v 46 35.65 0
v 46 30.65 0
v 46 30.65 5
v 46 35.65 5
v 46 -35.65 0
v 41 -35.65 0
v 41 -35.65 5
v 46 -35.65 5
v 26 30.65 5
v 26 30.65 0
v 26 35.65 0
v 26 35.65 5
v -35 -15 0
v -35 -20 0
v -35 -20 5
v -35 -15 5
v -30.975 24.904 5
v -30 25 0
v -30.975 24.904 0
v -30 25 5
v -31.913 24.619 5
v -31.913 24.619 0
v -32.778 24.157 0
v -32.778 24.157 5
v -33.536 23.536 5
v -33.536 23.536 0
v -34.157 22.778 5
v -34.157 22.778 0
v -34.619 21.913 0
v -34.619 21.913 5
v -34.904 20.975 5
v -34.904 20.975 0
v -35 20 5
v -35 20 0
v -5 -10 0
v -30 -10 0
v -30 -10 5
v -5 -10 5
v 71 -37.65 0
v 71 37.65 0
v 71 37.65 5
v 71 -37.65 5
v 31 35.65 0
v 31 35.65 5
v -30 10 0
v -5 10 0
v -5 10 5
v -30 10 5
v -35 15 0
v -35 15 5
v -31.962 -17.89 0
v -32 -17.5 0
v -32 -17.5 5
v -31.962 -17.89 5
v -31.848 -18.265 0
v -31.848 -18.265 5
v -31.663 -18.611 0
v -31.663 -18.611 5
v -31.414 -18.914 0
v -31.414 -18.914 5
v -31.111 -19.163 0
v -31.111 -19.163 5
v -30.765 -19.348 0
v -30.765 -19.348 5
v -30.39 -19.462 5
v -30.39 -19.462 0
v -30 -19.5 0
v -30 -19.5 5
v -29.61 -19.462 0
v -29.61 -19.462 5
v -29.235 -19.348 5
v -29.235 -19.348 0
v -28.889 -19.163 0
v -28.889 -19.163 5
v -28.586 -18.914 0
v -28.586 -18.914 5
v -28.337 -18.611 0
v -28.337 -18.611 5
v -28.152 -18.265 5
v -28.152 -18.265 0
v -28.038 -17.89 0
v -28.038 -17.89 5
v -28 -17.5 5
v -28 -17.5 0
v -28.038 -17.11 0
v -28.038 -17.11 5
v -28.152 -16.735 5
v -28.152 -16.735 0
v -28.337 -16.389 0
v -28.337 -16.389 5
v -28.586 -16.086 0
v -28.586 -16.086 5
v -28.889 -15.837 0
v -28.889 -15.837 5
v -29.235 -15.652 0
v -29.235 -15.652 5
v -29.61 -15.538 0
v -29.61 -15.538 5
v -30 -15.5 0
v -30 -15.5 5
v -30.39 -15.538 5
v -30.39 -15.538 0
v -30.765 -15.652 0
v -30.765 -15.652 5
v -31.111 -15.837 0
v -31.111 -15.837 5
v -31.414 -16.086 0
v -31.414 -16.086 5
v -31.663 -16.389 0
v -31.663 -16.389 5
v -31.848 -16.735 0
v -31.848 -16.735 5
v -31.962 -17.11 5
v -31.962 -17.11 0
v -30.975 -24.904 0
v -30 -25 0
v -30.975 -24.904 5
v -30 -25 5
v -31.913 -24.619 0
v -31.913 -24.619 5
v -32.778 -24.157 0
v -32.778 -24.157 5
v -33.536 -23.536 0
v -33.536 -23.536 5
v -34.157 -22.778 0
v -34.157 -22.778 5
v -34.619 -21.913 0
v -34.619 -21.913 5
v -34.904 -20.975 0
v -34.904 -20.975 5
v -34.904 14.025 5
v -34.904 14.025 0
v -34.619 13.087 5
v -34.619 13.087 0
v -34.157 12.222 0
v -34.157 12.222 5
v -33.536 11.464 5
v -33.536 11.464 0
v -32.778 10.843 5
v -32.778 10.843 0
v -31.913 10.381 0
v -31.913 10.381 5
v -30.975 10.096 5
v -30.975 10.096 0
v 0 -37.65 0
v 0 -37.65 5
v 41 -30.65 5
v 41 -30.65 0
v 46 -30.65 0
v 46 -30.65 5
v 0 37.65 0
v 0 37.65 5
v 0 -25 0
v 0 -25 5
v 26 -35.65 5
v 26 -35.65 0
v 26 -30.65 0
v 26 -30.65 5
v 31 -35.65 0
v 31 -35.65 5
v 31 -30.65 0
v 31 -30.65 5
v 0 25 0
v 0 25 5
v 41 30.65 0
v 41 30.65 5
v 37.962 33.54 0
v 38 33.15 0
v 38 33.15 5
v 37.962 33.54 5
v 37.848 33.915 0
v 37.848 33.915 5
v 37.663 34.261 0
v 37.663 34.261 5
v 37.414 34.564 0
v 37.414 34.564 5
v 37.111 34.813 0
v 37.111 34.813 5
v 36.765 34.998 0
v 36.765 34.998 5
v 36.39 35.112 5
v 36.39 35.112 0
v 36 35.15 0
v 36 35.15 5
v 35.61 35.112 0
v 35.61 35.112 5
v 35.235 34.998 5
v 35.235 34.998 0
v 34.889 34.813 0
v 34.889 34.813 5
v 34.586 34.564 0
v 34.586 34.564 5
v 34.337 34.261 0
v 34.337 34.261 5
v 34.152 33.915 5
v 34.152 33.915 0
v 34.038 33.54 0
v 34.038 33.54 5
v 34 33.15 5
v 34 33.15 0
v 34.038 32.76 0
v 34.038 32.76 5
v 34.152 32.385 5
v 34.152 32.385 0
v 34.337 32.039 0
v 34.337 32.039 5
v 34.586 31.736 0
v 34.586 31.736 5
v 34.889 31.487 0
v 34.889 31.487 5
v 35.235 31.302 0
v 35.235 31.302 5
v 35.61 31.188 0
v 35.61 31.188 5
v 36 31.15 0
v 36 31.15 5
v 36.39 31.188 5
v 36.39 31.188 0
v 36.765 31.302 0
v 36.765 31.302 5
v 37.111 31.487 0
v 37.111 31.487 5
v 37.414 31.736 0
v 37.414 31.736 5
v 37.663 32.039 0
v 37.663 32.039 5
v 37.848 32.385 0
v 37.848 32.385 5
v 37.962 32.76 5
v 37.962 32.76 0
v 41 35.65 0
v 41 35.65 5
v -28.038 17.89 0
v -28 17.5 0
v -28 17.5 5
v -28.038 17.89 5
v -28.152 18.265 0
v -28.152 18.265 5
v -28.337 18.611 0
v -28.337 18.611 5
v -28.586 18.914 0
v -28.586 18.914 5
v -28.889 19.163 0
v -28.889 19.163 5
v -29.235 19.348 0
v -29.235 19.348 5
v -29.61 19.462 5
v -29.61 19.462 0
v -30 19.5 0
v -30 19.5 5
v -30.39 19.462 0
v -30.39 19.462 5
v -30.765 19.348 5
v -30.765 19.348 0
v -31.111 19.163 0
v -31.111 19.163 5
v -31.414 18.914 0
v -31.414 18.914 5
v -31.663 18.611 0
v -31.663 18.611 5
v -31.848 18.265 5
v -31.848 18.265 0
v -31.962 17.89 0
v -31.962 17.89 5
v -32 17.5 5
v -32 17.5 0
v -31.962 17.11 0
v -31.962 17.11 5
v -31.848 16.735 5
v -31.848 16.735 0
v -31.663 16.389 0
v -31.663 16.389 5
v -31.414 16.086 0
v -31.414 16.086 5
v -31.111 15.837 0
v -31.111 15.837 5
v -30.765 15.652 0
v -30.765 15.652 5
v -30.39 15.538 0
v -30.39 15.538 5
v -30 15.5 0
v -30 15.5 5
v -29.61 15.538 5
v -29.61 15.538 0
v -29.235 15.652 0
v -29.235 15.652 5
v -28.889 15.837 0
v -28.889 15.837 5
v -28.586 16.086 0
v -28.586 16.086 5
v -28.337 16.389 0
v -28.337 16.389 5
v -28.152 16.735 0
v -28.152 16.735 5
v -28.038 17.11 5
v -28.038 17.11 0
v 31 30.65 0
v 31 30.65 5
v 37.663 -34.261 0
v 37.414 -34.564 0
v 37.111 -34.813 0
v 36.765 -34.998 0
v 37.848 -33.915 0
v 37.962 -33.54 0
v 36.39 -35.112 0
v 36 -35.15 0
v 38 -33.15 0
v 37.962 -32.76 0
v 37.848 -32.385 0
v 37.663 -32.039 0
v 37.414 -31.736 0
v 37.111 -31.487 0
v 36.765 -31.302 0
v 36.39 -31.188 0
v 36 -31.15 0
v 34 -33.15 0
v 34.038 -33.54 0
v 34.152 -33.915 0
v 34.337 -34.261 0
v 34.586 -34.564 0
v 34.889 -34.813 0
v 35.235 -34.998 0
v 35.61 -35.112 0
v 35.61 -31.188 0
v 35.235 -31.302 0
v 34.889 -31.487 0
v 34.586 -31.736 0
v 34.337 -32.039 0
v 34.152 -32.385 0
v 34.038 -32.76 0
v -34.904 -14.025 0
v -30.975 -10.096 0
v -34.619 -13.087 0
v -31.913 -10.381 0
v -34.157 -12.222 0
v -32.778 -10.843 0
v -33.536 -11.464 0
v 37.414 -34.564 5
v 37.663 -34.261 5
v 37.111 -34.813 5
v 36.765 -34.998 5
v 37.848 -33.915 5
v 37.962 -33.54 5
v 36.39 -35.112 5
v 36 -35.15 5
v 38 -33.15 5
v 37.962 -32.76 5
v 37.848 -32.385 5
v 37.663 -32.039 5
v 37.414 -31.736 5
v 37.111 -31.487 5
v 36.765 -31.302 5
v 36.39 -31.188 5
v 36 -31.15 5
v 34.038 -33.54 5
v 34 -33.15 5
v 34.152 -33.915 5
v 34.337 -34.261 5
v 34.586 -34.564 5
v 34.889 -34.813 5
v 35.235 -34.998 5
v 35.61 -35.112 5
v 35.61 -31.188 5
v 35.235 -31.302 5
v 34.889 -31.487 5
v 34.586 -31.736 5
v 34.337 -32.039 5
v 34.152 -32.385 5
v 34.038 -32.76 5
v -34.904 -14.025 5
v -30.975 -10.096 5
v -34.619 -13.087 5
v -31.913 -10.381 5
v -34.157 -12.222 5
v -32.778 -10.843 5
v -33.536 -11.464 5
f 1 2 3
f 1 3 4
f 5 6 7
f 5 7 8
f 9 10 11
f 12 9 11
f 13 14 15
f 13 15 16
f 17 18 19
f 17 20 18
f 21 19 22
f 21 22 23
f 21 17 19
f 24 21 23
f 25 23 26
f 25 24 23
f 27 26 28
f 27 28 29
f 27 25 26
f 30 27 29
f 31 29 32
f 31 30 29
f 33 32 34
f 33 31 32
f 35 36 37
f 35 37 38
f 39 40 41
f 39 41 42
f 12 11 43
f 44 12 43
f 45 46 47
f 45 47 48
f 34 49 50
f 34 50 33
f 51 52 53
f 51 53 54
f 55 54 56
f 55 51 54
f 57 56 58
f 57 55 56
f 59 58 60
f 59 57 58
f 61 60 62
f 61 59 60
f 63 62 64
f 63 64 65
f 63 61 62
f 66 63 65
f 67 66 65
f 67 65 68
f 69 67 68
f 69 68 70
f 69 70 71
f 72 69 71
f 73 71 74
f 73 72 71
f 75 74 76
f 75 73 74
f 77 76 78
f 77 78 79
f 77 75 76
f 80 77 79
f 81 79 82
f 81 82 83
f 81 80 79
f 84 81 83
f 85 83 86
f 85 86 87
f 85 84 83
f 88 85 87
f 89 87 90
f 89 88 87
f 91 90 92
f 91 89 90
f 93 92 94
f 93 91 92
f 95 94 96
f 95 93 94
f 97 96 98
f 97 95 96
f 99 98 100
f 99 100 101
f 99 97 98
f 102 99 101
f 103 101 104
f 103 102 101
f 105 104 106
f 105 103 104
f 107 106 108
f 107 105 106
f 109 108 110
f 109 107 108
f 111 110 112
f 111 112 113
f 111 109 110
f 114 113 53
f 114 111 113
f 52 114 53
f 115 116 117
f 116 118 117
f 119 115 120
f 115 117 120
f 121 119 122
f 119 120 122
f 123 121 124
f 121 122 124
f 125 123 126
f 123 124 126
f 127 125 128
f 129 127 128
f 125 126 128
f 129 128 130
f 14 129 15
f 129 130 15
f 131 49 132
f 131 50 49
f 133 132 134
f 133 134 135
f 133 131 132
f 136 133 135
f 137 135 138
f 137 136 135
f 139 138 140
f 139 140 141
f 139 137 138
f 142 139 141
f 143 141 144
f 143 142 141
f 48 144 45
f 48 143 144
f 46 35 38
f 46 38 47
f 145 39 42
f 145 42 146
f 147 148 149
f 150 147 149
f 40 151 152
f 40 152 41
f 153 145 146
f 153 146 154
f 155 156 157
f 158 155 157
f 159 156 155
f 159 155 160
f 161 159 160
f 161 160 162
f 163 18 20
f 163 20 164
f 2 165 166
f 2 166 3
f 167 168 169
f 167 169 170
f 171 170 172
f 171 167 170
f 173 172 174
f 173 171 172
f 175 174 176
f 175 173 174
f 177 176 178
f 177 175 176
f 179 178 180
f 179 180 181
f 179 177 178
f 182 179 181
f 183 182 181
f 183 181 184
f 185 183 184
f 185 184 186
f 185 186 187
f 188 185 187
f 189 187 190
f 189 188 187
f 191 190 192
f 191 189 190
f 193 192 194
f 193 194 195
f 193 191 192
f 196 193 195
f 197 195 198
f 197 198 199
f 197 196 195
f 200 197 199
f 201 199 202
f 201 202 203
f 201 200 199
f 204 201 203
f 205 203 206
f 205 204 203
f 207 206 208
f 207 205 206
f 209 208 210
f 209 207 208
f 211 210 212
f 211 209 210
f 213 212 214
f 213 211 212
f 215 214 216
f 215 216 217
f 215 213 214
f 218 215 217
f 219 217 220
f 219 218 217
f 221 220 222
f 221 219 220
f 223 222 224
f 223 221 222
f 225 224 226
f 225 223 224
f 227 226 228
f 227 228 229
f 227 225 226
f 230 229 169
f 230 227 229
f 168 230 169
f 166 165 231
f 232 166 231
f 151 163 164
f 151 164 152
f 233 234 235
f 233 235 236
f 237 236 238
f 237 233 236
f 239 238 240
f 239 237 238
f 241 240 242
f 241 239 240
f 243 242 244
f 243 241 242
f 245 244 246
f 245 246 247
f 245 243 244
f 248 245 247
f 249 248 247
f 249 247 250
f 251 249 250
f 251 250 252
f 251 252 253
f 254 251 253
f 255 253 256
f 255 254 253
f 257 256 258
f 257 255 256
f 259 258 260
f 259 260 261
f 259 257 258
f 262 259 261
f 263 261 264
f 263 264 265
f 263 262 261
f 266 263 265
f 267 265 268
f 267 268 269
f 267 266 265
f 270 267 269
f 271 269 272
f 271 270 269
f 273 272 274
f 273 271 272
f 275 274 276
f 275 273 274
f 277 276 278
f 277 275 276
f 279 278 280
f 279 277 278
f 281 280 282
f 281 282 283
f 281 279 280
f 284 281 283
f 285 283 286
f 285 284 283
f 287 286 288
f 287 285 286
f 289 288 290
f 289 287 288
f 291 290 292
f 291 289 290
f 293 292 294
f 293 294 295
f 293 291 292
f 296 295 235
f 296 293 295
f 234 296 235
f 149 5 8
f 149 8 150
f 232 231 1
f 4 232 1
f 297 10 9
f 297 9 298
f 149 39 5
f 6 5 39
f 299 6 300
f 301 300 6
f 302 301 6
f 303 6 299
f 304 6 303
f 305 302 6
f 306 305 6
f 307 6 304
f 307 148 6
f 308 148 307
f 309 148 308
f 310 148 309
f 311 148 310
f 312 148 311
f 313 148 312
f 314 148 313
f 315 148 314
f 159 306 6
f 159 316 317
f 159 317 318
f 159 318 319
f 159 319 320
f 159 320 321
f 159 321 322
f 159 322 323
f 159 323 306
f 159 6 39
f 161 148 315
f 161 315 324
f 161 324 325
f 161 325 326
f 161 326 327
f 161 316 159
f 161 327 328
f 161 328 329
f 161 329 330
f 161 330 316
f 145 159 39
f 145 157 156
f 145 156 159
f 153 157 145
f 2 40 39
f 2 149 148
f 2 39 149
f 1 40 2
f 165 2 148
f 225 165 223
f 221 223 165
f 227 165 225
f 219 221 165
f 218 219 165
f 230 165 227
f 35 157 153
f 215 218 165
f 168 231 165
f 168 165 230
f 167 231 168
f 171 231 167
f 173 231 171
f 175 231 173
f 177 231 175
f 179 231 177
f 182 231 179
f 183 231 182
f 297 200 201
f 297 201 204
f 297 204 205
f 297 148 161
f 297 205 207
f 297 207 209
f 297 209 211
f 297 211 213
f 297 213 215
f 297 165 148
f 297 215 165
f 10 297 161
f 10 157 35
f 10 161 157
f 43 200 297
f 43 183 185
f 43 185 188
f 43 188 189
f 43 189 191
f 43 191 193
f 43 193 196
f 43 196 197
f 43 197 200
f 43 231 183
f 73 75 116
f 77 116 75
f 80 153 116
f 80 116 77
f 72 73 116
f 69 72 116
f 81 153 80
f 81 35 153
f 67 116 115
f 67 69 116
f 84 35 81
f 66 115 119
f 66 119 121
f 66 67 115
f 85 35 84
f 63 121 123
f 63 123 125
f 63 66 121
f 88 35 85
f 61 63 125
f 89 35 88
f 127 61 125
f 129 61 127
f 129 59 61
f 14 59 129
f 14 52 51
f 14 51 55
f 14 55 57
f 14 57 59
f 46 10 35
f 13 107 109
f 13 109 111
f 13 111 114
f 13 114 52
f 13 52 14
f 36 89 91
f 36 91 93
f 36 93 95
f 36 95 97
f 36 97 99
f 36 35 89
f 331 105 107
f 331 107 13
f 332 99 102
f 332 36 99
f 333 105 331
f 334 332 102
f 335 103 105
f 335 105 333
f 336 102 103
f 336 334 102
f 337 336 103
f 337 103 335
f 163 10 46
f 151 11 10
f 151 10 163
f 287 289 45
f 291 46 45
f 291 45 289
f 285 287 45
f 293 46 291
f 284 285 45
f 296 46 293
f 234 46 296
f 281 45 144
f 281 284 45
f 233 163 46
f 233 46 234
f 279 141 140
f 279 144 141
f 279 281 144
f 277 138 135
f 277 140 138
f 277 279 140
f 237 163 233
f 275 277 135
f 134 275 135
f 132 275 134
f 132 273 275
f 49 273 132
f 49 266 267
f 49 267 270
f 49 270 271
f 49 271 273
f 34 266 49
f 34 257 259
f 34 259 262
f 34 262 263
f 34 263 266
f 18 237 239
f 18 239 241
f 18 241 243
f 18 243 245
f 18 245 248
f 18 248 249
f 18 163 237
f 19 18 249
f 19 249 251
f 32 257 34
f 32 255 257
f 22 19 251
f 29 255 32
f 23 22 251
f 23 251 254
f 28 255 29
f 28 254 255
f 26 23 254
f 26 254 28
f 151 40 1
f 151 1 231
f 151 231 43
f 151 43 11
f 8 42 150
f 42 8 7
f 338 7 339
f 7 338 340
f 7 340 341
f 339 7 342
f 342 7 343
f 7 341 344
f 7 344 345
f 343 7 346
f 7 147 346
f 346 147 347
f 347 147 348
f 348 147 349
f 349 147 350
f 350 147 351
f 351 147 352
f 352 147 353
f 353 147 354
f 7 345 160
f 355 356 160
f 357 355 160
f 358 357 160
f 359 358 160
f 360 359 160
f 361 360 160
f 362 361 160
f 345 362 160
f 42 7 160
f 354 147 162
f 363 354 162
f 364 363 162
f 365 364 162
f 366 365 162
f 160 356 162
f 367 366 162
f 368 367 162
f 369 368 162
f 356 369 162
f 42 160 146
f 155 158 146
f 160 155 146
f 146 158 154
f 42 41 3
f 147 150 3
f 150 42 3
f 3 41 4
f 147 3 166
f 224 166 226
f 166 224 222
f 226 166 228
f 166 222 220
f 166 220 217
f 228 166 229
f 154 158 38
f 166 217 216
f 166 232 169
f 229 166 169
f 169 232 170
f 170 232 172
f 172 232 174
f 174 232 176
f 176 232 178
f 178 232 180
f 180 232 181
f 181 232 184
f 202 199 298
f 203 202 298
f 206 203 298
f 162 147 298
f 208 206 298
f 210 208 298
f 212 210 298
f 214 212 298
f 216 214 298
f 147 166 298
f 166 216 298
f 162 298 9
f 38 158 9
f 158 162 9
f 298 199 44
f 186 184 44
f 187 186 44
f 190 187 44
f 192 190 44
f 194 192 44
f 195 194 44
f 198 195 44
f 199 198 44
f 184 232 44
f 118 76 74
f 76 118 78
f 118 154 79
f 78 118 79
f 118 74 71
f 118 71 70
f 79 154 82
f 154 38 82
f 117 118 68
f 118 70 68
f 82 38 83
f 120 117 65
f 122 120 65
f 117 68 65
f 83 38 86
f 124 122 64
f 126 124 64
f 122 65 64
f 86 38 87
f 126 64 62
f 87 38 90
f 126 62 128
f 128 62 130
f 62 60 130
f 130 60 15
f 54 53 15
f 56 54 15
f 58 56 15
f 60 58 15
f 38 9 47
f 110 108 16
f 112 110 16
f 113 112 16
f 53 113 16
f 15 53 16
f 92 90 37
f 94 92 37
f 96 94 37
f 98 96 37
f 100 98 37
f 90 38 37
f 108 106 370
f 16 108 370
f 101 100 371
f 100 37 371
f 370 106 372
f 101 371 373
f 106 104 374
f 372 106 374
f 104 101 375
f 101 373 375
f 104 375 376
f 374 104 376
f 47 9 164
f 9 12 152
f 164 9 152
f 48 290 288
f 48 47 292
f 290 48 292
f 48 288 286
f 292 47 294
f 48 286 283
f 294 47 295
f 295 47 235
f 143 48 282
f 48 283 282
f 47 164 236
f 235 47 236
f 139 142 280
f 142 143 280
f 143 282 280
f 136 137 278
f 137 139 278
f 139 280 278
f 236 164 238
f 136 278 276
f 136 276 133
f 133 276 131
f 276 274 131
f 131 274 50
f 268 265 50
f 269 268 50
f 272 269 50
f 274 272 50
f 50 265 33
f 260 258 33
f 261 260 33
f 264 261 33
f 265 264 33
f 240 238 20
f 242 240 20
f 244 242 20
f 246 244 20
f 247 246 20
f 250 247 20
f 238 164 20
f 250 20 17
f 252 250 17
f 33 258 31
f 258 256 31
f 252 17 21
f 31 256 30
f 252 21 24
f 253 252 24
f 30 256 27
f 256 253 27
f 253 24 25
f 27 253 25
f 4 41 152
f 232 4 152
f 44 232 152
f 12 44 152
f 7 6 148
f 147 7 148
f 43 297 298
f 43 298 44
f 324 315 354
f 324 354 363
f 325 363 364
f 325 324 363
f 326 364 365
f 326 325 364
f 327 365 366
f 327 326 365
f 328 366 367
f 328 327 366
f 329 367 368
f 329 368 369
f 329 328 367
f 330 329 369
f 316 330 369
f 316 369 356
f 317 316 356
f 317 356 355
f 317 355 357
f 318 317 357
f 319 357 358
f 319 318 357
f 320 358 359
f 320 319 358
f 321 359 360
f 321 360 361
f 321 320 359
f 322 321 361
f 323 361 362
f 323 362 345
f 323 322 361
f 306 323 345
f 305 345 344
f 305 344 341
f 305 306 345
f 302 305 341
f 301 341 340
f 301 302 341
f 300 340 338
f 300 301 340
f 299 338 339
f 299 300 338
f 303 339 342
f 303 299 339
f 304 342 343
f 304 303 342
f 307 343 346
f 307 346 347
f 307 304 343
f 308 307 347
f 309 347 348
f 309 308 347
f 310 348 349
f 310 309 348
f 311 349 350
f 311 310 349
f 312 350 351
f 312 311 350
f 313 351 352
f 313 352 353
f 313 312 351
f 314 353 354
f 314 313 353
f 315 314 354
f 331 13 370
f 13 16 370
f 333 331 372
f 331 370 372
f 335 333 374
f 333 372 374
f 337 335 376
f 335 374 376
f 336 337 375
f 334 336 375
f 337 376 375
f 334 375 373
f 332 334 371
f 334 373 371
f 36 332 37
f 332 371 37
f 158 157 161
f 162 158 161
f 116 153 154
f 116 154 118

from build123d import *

# Parameters (mm, degrees)
ESQUISSE1_R        = 2
ESQUISSE1_W        = 5
ESQUISSE1_H        = 5
BOSS_EXTRU_1_DEPTH = 5
CONG_1_R           = 5


with BuildPart() as part:
    # Esquisse1 → Boss.-Extru.1 (new body)
    with BuildSketch(Plane.XY):
        Polygon((0, 37.65), (71, 37.65), (71, -37.65), (0, -37.65), (0, -25), (-35, -25), (-35, -10), (-5, -10), (-5, 10), (-35, 10), (-35, 25), (0, 25), align=None)
        with Locations((-30, 17.5)):
            Circle(ESQUISSE1_R, mode=Mode.SUBTRACT)
        with Locations(Location((-30, -17.5, 0), (0, 0, 180))):
            Circle(ESQUISSE1_R, mode=Mode.SUBTRACT)
        with Locations((36, 33.15)):
            Circle(ESQUISSE1_R, mode=Mode.SUBTRACT)
        with Locations(Location((36, -33.15, 0), (0, 0, 90))):
            Circle(ESQUISSE1_R, mode=Mode.SUBTRACT)
        with Locations((28.5, 33.15)):
            Rectangle(ESQUISSE1_W, ESQUISSE1_H, mode=Mode.SUBTRACT)
        with Locations((43.5, 33.15)):
            Rectangle(ESQUISSE1_W, ESQUISSE1_H, mode=Mode.SUBTRACT)
        with Locations((28.5, -33.15)):
            Rectangle(ESQUISSE1_W, ESQUISSE1_H, mode=Mode.SUBTRACT)
        with Locations((43.5, -33.15)):
            Rectangle(ESQUISSE1_W, ESQUISSE1_H, mode=Mode.SUBTRACT)
    extrude(amount=BOSS_EXTRU_1_DEPTH)

    # Congé1
    cong_1_edges = [part.edges().sort_by_distance(p)[0] for p in [
        (-35, -10, 2.5),
        (-35, 10, 2.5),
        (-35, 25, 2.5),
        (-35, -25, 2.5),
    ]]
    fillet(cong_1_edges, radius=CONG_1_R)


solid = part.part
